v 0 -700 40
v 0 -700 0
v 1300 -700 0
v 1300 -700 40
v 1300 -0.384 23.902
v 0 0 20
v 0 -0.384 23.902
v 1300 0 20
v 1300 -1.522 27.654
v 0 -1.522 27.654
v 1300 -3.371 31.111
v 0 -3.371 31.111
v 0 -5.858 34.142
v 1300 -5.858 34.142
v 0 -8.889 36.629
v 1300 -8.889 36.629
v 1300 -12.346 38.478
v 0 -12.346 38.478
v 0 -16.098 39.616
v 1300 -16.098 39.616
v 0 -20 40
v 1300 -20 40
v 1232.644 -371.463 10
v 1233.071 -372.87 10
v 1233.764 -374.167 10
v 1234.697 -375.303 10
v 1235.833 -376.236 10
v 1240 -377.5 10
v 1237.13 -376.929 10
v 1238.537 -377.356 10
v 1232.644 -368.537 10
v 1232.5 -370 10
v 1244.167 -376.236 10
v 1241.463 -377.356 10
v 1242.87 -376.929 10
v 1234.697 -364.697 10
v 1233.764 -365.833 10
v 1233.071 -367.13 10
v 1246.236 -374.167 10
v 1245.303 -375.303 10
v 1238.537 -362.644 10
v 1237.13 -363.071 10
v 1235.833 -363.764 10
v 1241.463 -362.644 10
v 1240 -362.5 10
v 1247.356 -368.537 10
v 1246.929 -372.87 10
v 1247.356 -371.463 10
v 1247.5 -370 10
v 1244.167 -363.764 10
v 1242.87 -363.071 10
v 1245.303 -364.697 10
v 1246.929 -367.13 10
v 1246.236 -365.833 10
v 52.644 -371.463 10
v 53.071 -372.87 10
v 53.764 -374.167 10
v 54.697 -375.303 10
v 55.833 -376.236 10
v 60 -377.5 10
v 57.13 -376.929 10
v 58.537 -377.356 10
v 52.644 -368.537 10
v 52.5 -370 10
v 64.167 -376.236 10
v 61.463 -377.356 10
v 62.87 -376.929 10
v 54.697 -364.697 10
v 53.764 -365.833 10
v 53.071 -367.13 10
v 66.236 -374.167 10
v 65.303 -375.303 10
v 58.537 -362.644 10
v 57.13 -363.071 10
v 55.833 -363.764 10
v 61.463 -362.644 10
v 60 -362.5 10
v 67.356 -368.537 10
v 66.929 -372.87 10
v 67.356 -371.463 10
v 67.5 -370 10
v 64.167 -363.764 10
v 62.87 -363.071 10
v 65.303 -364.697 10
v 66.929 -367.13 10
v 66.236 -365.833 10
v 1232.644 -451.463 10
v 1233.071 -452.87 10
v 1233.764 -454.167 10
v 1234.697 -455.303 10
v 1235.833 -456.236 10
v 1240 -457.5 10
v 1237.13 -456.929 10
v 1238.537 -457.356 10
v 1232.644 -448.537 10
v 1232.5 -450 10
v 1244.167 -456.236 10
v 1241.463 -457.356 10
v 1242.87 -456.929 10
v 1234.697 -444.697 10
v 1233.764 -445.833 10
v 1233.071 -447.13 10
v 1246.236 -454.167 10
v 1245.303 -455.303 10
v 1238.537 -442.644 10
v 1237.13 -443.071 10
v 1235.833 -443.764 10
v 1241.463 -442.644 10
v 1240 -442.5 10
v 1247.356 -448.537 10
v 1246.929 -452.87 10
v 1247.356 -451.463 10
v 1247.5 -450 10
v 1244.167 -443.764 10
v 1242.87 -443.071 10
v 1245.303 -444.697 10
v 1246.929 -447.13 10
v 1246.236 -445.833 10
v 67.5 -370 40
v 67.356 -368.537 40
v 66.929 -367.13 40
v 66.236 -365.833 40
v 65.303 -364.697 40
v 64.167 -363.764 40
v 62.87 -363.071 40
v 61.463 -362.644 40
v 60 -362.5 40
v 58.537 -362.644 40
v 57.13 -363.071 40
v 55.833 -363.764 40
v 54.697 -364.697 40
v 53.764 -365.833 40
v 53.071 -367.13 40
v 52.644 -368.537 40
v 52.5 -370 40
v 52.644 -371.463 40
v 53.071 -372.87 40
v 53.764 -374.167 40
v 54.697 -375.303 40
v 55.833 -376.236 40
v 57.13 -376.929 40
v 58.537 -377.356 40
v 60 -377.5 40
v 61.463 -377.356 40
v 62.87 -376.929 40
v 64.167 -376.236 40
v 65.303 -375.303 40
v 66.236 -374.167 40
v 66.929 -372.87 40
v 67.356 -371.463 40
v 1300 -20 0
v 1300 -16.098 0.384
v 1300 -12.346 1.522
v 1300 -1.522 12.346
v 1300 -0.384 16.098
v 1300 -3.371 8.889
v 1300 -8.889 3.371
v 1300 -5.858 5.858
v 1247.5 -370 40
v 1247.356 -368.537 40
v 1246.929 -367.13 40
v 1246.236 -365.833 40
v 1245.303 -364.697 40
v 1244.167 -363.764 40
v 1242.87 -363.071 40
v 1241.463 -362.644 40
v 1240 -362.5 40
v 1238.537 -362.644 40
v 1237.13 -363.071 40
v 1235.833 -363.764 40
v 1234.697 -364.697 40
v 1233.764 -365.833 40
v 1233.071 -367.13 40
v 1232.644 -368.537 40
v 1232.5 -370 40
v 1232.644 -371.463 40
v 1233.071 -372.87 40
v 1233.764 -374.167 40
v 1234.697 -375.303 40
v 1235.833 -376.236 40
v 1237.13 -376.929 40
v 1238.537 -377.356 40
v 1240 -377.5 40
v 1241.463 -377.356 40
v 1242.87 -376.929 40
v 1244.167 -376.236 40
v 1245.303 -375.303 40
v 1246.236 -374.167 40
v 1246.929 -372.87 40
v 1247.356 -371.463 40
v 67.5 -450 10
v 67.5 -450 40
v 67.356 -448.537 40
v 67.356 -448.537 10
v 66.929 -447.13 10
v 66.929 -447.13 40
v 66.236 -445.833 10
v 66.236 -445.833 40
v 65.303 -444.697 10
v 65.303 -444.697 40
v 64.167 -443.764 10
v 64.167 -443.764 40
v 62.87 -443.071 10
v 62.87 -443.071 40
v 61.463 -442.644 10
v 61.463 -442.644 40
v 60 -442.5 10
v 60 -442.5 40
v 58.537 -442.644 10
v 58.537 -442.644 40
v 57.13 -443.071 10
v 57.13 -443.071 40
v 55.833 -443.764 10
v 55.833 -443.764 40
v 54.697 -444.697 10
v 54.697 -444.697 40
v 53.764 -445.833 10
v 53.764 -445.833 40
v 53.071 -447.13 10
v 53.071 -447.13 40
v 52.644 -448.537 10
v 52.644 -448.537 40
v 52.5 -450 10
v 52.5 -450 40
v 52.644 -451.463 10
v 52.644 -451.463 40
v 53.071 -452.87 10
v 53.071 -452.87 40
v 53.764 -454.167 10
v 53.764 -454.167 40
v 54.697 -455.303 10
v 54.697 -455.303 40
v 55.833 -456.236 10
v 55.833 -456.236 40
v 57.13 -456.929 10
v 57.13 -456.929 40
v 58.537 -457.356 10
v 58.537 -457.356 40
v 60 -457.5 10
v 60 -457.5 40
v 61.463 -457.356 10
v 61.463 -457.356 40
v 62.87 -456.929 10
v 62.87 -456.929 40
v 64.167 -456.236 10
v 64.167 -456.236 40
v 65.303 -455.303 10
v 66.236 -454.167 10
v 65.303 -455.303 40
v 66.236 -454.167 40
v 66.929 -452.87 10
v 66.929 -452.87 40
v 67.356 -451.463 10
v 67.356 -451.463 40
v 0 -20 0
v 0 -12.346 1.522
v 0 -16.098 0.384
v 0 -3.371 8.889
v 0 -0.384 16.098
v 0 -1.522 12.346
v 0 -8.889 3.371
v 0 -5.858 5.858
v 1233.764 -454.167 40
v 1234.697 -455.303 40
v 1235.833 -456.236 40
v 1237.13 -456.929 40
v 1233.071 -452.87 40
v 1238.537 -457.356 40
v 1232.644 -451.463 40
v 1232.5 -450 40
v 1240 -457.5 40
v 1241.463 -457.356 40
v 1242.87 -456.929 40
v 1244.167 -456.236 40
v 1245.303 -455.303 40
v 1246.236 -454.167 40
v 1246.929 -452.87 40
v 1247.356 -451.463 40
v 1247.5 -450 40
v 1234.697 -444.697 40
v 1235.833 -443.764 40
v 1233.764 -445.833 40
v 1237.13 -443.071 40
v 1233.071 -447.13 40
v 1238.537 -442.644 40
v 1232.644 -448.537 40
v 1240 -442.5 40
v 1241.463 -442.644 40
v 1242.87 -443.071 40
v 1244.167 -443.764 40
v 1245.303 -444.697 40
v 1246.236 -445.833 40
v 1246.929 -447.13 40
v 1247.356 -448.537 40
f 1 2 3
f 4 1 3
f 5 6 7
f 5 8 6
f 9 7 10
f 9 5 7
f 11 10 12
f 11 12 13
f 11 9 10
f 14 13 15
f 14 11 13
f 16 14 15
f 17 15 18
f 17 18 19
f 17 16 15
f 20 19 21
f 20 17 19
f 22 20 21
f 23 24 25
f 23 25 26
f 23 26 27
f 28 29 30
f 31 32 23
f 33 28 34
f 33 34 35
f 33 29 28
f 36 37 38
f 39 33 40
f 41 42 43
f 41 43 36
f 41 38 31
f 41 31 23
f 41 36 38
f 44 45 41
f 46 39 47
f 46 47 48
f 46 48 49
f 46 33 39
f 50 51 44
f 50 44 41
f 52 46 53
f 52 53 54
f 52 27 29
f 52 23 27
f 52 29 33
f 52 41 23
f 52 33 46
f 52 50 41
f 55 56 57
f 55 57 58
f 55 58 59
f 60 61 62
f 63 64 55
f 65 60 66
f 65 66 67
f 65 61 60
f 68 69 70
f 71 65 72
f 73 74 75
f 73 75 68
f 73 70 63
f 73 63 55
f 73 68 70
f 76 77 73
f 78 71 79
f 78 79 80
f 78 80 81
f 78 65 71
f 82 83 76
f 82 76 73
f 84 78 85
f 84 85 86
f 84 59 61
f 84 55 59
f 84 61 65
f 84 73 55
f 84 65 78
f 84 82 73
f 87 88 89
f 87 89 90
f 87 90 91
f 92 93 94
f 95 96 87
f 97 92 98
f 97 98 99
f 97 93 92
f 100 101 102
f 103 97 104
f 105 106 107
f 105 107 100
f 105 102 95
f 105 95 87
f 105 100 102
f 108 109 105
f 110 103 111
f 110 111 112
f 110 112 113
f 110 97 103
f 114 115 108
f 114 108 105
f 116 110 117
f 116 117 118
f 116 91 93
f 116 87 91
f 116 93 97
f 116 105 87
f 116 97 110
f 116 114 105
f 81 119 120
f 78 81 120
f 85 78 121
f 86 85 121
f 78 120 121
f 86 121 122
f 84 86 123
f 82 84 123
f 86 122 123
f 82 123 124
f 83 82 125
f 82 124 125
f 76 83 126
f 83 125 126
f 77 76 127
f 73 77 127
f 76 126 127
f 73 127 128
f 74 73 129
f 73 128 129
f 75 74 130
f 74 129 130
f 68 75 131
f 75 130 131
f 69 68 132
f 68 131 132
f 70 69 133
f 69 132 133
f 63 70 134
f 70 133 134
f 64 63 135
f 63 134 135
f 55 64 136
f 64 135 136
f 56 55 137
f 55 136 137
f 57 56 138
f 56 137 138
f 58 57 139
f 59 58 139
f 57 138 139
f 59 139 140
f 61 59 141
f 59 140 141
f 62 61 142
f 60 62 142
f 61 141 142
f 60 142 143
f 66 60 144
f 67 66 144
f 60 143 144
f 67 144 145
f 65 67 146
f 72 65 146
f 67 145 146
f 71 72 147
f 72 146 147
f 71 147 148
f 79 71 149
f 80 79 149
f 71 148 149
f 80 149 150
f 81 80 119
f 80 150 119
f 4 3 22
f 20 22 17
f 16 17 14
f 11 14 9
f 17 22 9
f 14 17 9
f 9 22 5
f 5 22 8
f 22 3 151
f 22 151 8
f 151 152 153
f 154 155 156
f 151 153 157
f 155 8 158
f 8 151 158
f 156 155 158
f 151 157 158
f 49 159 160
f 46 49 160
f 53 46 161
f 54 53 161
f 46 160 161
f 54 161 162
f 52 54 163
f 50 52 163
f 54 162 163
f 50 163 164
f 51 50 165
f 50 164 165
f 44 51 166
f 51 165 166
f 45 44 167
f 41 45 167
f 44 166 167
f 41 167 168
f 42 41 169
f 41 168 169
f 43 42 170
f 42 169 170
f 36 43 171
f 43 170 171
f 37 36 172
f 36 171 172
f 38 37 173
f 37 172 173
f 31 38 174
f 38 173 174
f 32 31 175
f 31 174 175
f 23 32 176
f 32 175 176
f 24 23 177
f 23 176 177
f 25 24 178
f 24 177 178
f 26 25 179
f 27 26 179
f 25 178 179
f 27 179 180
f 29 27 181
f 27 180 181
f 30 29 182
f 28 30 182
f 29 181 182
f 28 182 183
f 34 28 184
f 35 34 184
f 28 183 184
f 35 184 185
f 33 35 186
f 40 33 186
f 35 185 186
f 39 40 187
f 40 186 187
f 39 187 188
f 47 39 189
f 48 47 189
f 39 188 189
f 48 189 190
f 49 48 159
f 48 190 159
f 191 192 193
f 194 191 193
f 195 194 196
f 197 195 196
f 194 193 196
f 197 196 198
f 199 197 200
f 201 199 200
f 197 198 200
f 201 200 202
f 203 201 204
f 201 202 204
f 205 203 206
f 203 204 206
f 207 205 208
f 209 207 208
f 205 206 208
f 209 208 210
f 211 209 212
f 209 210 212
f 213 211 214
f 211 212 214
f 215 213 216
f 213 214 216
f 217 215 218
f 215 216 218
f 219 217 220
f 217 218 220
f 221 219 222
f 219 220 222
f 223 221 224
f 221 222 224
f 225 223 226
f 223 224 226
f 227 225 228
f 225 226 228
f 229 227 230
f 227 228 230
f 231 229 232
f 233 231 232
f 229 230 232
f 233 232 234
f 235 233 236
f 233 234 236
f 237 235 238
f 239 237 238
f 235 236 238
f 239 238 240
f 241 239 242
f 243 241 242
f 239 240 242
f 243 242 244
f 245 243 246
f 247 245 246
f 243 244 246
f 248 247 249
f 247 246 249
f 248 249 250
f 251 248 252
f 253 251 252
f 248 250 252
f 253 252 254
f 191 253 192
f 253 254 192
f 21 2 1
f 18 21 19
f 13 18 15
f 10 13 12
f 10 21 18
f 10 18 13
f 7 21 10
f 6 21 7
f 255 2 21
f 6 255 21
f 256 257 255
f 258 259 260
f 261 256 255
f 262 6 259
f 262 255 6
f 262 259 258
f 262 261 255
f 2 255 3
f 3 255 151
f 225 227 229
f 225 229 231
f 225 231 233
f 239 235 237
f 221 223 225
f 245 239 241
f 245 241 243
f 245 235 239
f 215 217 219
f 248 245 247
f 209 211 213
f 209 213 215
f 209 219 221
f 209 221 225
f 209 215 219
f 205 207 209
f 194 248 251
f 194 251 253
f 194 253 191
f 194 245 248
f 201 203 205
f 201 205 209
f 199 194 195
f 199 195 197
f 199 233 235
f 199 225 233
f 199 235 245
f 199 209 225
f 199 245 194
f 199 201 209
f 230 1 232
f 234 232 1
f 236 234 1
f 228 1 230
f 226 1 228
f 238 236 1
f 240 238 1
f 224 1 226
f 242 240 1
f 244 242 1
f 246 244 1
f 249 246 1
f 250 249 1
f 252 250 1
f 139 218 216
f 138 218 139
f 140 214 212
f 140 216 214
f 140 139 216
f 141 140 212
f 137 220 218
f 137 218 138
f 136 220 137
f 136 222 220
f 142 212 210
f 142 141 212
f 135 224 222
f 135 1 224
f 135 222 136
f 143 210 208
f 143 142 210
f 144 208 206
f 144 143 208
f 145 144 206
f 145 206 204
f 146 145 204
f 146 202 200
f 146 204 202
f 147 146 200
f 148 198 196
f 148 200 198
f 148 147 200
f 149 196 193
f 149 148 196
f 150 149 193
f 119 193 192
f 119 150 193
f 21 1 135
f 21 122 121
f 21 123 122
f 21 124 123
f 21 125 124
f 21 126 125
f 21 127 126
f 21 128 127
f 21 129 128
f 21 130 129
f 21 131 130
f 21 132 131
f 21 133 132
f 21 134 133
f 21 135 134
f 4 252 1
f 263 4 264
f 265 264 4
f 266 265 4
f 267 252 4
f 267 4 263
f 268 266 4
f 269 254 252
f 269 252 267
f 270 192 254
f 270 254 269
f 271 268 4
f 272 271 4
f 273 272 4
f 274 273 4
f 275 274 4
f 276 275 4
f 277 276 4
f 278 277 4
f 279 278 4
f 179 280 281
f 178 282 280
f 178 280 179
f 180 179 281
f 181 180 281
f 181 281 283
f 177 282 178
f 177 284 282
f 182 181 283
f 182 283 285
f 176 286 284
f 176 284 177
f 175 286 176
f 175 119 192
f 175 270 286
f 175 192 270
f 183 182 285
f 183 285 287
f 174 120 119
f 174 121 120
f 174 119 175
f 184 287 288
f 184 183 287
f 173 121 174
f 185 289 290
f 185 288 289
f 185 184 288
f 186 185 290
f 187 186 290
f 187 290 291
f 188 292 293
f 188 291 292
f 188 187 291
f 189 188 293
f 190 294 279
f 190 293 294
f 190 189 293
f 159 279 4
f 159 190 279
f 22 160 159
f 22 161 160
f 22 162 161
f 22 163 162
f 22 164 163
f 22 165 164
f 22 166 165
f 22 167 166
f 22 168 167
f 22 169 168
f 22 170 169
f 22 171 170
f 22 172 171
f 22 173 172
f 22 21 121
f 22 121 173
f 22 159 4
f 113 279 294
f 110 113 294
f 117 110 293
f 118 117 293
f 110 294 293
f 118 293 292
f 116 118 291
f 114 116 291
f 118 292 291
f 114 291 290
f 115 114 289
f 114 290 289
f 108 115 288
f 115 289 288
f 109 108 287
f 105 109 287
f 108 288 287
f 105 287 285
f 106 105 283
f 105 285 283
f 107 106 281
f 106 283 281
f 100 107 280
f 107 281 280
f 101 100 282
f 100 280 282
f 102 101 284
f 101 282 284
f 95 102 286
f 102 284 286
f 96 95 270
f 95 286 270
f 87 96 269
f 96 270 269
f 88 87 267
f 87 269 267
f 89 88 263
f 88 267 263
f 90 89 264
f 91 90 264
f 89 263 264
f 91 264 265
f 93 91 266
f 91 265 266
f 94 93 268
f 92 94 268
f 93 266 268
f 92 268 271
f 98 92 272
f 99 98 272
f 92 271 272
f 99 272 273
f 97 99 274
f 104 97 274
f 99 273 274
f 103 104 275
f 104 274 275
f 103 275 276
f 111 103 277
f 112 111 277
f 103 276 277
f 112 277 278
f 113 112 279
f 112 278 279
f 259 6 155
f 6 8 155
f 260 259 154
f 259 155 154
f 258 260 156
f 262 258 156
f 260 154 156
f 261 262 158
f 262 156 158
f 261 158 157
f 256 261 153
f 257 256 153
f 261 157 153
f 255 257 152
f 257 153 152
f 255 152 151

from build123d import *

# Parameters (mm, degrees)
SCHIZZO1_W                   = 1300
SCHIZZO1_H                   = 700
ESTRUSIONE_ESTRUSIONE1_DEPTH = 40
RACCORDO1_R                  = 20
SCHIZZO2_R                   = 7.5
TAGLIO_ESTRUSIONE1_DEPTH     = 30


with BuildPart() as part:
    # Schizzo1 → Estrusione-Estrusione1 (new body)
    with BuildSketch(Plane.XY):
        with Locations((650, -350)):
            Rectangle(SCHIZZO1_W, SCHIZZO1_H)
    extrude(amount=ESTRUSIONE_ESTRUSIONE1_DEPTH)

    # Raccordo1
    raccordo1_edges = [part.edges().sort_by_distance(p)[0] for p in [
        (650, 0, 0),
        (650, 0, 40),
    ]]
    fillet(raccordo1_edges, radius=RACCORDO1_R - 0.0001)  # a hair under: the kernel refuses the full size

    # Schizzo2 → Taglio-Estrusione1 (cut)
    with BuildSketch(Plane.XY.offset(40)):
        with Locations((60, -370)):
            Circle(SCHIZZO2_R)
        with Locations((60, -450)):
            Circle(SCHIZZO2_R)
        with Locations((1240, -370)):
            Circle(SCHIZZO2_R)
        with Locations((1240, -450)):
            Circle(SCHIZZO2_R)
    extrude(amount=-TAGLIO_ESTRUSIONE1_DEPTH, mode=Mode.SUBTRACT)


solid = part.part
